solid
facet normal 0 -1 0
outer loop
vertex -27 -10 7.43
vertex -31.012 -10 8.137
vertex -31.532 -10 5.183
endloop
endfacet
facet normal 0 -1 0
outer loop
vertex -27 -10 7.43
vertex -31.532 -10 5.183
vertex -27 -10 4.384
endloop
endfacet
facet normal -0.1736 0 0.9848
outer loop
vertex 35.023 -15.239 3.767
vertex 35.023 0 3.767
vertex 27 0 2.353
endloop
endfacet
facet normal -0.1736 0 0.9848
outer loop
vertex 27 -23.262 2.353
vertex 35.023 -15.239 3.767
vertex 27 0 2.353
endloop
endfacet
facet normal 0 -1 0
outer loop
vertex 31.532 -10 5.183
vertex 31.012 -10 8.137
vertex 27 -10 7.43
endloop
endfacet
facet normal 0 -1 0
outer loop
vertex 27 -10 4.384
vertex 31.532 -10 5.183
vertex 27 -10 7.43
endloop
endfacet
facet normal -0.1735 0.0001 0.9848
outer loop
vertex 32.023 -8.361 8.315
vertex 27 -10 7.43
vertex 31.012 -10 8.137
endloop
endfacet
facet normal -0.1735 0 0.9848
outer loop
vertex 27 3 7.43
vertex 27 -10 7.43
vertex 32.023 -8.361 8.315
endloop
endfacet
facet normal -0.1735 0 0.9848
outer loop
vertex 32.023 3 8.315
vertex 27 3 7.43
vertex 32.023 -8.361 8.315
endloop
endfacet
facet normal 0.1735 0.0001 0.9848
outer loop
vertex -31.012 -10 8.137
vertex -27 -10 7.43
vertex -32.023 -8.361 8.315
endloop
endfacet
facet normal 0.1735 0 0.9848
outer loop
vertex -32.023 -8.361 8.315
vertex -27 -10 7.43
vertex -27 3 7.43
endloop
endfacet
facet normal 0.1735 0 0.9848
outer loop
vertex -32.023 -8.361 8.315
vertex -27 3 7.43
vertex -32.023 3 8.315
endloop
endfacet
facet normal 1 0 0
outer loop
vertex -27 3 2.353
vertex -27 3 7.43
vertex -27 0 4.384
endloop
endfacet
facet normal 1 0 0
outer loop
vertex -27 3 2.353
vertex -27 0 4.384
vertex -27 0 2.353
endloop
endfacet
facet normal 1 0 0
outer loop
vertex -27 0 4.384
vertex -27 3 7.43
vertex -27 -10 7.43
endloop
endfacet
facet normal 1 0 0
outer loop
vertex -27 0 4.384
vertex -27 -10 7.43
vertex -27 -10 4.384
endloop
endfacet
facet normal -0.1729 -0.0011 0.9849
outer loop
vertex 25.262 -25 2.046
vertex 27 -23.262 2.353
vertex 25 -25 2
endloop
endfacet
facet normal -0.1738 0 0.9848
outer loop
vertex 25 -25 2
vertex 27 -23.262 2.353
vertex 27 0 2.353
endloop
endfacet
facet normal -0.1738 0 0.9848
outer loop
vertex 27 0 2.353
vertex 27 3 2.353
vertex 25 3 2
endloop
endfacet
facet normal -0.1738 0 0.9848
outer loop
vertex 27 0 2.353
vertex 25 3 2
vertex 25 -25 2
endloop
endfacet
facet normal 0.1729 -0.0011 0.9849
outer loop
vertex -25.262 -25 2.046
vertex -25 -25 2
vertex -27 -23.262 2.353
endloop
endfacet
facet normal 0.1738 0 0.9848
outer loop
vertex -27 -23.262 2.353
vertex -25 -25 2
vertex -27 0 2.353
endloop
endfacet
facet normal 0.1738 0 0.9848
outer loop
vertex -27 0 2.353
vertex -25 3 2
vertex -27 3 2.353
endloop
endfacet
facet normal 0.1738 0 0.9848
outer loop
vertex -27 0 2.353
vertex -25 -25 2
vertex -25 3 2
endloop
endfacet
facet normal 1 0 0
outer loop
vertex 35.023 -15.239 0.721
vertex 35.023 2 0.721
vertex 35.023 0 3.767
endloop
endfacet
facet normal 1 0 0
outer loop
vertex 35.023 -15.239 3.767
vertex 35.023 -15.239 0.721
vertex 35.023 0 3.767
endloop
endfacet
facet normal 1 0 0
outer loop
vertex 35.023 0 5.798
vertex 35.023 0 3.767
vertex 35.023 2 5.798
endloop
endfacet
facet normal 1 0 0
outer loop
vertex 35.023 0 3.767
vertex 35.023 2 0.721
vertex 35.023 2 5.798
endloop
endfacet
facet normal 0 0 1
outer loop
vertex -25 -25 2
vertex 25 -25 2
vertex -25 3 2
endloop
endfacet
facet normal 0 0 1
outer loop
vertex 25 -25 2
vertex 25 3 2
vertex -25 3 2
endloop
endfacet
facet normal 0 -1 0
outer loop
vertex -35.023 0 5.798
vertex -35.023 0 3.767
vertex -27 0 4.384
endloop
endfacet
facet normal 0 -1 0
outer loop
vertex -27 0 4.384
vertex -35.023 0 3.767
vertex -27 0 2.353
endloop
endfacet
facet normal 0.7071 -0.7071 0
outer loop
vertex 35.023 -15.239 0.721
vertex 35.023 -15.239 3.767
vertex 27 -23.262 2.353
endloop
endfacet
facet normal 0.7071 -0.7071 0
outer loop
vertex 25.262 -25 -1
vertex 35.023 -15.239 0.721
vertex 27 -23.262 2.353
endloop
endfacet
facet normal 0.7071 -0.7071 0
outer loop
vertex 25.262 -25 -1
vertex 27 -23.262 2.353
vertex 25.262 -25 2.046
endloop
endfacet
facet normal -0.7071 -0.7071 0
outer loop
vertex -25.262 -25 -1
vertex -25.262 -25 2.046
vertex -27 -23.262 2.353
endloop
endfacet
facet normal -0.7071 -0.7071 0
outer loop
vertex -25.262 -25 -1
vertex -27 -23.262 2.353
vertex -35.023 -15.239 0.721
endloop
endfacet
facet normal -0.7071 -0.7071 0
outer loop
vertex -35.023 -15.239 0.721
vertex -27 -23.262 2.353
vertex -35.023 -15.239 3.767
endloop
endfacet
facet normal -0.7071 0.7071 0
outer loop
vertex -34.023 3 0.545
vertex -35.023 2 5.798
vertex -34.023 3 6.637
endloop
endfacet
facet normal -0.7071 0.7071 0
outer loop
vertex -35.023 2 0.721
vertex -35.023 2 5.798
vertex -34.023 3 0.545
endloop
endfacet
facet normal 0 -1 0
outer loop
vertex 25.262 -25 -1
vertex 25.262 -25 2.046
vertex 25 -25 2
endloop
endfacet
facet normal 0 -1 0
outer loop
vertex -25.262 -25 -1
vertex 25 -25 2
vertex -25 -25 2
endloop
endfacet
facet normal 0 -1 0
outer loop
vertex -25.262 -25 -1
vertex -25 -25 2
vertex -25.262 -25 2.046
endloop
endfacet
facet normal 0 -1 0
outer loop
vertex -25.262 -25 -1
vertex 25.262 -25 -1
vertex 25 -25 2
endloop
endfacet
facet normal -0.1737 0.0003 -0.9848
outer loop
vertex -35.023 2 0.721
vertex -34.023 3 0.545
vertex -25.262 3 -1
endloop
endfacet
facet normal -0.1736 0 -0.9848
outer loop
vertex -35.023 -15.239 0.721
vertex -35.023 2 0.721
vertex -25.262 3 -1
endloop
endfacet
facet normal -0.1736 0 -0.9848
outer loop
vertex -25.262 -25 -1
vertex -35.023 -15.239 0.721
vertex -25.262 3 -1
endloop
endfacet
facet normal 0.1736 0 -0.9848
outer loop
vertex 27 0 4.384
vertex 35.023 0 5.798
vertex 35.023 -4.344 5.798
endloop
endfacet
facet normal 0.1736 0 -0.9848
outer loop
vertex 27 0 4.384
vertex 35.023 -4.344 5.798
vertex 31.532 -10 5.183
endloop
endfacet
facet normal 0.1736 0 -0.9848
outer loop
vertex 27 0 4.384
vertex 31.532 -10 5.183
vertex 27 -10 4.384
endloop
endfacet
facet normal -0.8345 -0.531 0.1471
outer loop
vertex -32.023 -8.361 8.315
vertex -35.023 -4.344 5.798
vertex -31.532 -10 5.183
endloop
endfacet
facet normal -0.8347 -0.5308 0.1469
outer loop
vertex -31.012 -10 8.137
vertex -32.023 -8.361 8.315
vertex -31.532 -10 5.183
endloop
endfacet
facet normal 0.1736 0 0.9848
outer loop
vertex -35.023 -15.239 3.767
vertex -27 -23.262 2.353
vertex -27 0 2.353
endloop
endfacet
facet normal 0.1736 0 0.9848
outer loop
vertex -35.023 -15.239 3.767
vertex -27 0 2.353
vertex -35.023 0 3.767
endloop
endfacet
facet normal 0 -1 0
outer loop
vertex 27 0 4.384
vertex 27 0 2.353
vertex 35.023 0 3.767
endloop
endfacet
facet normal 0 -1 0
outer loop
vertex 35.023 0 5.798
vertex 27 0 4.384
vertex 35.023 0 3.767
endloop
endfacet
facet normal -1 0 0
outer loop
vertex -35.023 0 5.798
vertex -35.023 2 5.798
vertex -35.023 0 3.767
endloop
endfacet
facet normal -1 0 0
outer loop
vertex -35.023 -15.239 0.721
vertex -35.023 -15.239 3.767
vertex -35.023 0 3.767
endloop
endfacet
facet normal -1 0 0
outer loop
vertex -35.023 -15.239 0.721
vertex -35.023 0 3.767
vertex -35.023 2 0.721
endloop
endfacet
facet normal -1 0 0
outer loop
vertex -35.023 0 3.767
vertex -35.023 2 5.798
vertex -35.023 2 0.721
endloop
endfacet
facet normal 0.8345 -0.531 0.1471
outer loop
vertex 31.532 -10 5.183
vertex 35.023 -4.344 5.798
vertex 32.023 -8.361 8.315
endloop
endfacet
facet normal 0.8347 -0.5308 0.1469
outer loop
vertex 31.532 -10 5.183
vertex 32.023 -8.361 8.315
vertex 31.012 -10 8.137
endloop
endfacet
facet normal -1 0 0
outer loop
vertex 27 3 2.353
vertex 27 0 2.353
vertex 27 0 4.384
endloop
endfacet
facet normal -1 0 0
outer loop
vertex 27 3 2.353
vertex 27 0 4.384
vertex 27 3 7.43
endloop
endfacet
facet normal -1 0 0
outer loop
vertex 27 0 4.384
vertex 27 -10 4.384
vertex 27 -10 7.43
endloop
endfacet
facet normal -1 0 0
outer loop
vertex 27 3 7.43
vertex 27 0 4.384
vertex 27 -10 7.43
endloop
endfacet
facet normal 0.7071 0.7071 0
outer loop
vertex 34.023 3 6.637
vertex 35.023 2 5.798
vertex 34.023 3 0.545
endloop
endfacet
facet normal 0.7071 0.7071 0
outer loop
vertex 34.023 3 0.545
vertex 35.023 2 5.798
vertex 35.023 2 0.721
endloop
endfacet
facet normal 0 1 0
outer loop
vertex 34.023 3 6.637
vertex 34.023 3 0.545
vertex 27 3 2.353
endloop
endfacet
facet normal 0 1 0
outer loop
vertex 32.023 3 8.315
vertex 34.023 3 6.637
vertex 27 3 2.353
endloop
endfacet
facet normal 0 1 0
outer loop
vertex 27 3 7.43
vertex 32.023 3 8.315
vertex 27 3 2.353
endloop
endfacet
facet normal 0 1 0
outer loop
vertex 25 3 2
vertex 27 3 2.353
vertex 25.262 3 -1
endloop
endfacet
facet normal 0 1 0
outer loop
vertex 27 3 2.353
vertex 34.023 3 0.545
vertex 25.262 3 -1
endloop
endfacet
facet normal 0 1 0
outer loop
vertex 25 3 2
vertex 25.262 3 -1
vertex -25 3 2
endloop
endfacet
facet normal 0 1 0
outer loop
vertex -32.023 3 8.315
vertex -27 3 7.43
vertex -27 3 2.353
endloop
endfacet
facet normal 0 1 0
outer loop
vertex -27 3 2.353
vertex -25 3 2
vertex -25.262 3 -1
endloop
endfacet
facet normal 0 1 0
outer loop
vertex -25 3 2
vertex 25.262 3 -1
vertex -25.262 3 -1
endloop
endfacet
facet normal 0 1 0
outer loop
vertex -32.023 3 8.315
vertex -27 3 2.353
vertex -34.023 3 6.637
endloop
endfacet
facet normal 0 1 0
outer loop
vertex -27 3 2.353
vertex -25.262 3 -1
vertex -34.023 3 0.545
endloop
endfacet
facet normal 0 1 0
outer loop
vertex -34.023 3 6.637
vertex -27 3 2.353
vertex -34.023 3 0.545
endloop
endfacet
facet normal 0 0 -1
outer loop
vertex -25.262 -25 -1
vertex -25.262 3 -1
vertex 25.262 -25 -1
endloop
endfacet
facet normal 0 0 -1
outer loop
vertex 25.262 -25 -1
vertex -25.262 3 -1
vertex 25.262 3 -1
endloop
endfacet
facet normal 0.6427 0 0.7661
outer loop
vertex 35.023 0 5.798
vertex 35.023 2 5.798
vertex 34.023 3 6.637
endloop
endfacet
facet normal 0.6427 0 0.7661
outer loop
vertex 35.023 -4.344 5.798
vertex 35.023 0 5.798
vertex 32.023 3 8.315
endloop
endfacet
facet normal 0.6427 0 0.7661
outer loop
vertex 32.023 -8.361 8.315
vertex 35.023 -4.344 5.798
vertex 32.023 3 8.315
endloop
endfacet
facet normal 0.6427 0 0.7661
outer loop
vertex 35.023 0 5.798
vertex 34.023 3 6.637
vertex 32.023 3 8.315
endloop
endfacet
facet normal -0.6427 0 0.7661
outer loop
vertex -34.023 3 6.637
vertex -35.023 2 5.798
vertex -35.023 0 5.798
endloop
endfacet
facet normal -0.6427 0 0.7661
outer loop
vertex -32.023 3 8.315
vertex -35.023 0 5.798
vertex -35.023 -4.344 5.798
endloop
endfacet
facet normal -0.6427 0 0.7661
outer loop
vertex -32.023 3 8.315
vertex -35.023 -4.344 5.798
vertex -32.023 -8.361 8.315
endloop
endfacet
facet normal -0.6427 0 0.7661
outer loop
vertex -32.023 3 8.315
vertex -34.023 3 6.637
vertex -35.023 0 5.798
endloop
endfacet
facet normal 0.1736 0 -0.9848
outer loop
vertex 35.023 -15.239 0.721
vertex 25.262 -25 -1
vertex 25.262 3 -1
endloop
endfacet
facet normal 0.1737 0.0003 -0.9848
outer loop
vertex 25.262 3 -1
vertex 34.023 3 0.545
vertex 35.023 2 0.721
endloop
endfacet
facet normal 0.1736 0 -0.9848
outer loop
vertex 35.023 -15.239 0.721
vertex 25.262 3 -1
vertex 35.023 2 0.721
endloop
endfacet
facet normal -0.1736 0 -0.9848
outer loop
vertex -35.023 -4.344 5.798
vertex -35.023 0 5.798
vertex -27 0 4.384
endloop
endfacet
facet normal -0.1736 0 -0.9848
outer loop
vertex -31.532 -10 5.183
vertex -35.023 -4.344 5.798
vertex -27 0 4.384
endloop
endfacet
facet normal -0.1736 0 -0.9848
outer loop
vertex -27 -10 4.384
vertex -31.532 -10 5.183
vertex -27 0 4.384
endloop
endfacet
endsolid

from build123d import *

# Parameters (mm, degrees)
BOSS_EXTRUDE1_DEPTH = 3
BOSS_EXTRUDE2_DEPTH = 25
BOSS_EXTRUDE3_START = -3
BOSS_EXTRUDE3_DEPTH = 13
BOSS_EXTRUDE5_DEPTH = 28
CUT_EXTRUDE9_START  = -4.767335
CUT_EXTRUDE9_DEPTH  = 4.767335
CUT_EXTRUDE10_DEPTH = 3
CUT_EXTRUDE11_DEPTH = 3
CUT_EXTRUDE14_START = -13
CUT_EXTRUDE14_DEPTH = 11.360991
CUT_EXTRUDE15_START = -13
CUT_EXTRUDE15_DEPTH = 11.360991
CHAMFER4_SIZE       = 1


with BuildPart() as part:
    # Sketch12 → Boss-Extrude1 (new body)
    with BuildSketch(Plane(origin=(0, 0, 0), x_dir=(1, 0, 0), z_dir=(0, 1, 0))):
        Polygon((-27, -6.414360409), (-27, -2.352653961), (-25, -2), (25, -2), (27, -2.352653961), (27, -6.414360409), (35.023054857, -7.829041448), (35.023054857, -1.736481777), (25.174977327, 0), (-25.174977327, 0), (-35.023054857, -1.736481777), (-35.023054857, -7.829041448), align=None)
    extrude(amount=BOSS_EXTRUDE1_DEPTH)

    # Sketch13 → Boss-Extrude2 (add)
    with BuildSketch(Plane.XZ):
        Polygon((25.174977327, 0), (35.023054857, 1.736481777), (35.023054857, 3.767335), (27, 2.352653961), (25, 2), (-25, 2), (-27, 2.352653961), (-35.023054857, 3.767335), (-35.023054857, 1.736481777), (-25.174977327, 0), align=None)
    extrude(amount=BOSS_EXTRUDE2_DEPTH)

    # Sketch14 → Boss-Extrude3 (add)
    with BuildSketch(Plane.XZ.offset(BOSS_EXTRUDE3_START)):
        Polygon((-35.023054857, 5.798188224), (-27, 4.383507185), (-27, 7.429787021), (-35.023054857, 8.84446806), align=None)
        Polygon((27, 7.429787021), (35.023054857, 8.84446806), (35.023054857, 5.798188224), (27, 4.383507185), align=None)
    extrude(amount=BOSS_EXTRUDE3_DEPTH)

    # Sketch24 → Boss-Extrude5 (add)
    with BuildSketch(Plane(origin=(0, 3, 0), x_dir=(1, 0, 0), z_dir=(0, 1, 0))):
        Polygon((-35.023054857, -0.721055165), (-25.262465991, 1), (25.262465991, 1), (35.023054857, -0.721055165), (35.023054857, -1.736481777), (25.174977327, 0), (-25.174977327, 0), (-35.023054857, -1.736481777), align=None)
    extrude(amount=-BOSS_EXTRUDE5_DEPTH)

    # Sketch26 → Cut-Extrude9 (cut)
    with BuildSketch(Plane(origin=(0, 0, -1), x_dir=(-1, 0, 0), z_dir=(0, 0, -1)).offset(CUT_EXTRUDE9_START)):
        Polygon((-25.262465991, -25), (-35.023054857, -25), (-35.023054857, -15.239411133), align=None)
        Polygon((25.262465991, -25), (35.023054857, -15.239411133), (35.023054857, -25), align=None)
    extrude(amount=CUT_EXTRUDE9_DEPTH, mode=Mode.SUBTRACT)

    # Sketch27 → Cut-Extrude10 (cut)
    with BuildSketch(Plane(origin=(0.456418791, 0, 2.588479594), x_dir=(0.9848077530121054, 0, -0.17364817766751295), z_dir=(0.17364817766751295, 0, 0.9848077530121054))):
        Polygon((-36.026801719, -3.5), (-31.953390013, -10), (-36.026801719, -10), align=None)
    extrude(amount=-CUT_EXTRUDE10_DEPTH, mode=Mode.SUBTRACT)

    # Sketch28 → Cut-Extrude11 (cut)
    with BuildSketch(Plane(origin=(-0.456418791, 0, 2.588479594), x_dir=(0.9848077530121067, 0, 0.17364817766750618), z_dir=(-0.17364817766750618, 0, 0.9848077530121067))):
        Polygon((36.026801719, -3.5), (31.953390013, -10), (36.026801719, -10), align=None)
    extrude(amount=-CUT_EXTRUDE11_DEPTH, mode=Mode.SUBTRACT)

    # Sketch31 → Cut-Extrude14 (cut)
    with BuildSketch(Plane.XZ.offset(10).offset(CUT_EXTRUDE14_START)):
        Polygon((35.023054857, 5.798188224), (32.023054857, 8.315487118), (35.023054857, 8.84446806), align=None)
    extrude(amount=CUT_EXTRUDE14_DEPTH, mode=Mode.SUBTRACT)

    # Sketch33 → Cut-Extrude15 (cut)
    with BuildSketch(Plane.XZ.offset(10).offset(CUT_EXTRUDE15_START)):
        Polygon((-35.023054857, 5.798188224), (-32.023054857, 8.315487118), (-35.023054857, 8.84446806), align=None)
    extrude(amount=CUT_EXTRUDE15_DEPTH, mode=Mode.SUBTRACT)

    # Chamfer4
    chamfer4_edges = [part.edges().sort_by_distance(p)[0] for p in [
        (35.023054857, 3, 3.259621695),
        (-35.023054857, 3, 3.259621695),
    ]]
    chamfer(chamfer4_edges, length=CHAMFER4_SIZE)


solid = part.part
